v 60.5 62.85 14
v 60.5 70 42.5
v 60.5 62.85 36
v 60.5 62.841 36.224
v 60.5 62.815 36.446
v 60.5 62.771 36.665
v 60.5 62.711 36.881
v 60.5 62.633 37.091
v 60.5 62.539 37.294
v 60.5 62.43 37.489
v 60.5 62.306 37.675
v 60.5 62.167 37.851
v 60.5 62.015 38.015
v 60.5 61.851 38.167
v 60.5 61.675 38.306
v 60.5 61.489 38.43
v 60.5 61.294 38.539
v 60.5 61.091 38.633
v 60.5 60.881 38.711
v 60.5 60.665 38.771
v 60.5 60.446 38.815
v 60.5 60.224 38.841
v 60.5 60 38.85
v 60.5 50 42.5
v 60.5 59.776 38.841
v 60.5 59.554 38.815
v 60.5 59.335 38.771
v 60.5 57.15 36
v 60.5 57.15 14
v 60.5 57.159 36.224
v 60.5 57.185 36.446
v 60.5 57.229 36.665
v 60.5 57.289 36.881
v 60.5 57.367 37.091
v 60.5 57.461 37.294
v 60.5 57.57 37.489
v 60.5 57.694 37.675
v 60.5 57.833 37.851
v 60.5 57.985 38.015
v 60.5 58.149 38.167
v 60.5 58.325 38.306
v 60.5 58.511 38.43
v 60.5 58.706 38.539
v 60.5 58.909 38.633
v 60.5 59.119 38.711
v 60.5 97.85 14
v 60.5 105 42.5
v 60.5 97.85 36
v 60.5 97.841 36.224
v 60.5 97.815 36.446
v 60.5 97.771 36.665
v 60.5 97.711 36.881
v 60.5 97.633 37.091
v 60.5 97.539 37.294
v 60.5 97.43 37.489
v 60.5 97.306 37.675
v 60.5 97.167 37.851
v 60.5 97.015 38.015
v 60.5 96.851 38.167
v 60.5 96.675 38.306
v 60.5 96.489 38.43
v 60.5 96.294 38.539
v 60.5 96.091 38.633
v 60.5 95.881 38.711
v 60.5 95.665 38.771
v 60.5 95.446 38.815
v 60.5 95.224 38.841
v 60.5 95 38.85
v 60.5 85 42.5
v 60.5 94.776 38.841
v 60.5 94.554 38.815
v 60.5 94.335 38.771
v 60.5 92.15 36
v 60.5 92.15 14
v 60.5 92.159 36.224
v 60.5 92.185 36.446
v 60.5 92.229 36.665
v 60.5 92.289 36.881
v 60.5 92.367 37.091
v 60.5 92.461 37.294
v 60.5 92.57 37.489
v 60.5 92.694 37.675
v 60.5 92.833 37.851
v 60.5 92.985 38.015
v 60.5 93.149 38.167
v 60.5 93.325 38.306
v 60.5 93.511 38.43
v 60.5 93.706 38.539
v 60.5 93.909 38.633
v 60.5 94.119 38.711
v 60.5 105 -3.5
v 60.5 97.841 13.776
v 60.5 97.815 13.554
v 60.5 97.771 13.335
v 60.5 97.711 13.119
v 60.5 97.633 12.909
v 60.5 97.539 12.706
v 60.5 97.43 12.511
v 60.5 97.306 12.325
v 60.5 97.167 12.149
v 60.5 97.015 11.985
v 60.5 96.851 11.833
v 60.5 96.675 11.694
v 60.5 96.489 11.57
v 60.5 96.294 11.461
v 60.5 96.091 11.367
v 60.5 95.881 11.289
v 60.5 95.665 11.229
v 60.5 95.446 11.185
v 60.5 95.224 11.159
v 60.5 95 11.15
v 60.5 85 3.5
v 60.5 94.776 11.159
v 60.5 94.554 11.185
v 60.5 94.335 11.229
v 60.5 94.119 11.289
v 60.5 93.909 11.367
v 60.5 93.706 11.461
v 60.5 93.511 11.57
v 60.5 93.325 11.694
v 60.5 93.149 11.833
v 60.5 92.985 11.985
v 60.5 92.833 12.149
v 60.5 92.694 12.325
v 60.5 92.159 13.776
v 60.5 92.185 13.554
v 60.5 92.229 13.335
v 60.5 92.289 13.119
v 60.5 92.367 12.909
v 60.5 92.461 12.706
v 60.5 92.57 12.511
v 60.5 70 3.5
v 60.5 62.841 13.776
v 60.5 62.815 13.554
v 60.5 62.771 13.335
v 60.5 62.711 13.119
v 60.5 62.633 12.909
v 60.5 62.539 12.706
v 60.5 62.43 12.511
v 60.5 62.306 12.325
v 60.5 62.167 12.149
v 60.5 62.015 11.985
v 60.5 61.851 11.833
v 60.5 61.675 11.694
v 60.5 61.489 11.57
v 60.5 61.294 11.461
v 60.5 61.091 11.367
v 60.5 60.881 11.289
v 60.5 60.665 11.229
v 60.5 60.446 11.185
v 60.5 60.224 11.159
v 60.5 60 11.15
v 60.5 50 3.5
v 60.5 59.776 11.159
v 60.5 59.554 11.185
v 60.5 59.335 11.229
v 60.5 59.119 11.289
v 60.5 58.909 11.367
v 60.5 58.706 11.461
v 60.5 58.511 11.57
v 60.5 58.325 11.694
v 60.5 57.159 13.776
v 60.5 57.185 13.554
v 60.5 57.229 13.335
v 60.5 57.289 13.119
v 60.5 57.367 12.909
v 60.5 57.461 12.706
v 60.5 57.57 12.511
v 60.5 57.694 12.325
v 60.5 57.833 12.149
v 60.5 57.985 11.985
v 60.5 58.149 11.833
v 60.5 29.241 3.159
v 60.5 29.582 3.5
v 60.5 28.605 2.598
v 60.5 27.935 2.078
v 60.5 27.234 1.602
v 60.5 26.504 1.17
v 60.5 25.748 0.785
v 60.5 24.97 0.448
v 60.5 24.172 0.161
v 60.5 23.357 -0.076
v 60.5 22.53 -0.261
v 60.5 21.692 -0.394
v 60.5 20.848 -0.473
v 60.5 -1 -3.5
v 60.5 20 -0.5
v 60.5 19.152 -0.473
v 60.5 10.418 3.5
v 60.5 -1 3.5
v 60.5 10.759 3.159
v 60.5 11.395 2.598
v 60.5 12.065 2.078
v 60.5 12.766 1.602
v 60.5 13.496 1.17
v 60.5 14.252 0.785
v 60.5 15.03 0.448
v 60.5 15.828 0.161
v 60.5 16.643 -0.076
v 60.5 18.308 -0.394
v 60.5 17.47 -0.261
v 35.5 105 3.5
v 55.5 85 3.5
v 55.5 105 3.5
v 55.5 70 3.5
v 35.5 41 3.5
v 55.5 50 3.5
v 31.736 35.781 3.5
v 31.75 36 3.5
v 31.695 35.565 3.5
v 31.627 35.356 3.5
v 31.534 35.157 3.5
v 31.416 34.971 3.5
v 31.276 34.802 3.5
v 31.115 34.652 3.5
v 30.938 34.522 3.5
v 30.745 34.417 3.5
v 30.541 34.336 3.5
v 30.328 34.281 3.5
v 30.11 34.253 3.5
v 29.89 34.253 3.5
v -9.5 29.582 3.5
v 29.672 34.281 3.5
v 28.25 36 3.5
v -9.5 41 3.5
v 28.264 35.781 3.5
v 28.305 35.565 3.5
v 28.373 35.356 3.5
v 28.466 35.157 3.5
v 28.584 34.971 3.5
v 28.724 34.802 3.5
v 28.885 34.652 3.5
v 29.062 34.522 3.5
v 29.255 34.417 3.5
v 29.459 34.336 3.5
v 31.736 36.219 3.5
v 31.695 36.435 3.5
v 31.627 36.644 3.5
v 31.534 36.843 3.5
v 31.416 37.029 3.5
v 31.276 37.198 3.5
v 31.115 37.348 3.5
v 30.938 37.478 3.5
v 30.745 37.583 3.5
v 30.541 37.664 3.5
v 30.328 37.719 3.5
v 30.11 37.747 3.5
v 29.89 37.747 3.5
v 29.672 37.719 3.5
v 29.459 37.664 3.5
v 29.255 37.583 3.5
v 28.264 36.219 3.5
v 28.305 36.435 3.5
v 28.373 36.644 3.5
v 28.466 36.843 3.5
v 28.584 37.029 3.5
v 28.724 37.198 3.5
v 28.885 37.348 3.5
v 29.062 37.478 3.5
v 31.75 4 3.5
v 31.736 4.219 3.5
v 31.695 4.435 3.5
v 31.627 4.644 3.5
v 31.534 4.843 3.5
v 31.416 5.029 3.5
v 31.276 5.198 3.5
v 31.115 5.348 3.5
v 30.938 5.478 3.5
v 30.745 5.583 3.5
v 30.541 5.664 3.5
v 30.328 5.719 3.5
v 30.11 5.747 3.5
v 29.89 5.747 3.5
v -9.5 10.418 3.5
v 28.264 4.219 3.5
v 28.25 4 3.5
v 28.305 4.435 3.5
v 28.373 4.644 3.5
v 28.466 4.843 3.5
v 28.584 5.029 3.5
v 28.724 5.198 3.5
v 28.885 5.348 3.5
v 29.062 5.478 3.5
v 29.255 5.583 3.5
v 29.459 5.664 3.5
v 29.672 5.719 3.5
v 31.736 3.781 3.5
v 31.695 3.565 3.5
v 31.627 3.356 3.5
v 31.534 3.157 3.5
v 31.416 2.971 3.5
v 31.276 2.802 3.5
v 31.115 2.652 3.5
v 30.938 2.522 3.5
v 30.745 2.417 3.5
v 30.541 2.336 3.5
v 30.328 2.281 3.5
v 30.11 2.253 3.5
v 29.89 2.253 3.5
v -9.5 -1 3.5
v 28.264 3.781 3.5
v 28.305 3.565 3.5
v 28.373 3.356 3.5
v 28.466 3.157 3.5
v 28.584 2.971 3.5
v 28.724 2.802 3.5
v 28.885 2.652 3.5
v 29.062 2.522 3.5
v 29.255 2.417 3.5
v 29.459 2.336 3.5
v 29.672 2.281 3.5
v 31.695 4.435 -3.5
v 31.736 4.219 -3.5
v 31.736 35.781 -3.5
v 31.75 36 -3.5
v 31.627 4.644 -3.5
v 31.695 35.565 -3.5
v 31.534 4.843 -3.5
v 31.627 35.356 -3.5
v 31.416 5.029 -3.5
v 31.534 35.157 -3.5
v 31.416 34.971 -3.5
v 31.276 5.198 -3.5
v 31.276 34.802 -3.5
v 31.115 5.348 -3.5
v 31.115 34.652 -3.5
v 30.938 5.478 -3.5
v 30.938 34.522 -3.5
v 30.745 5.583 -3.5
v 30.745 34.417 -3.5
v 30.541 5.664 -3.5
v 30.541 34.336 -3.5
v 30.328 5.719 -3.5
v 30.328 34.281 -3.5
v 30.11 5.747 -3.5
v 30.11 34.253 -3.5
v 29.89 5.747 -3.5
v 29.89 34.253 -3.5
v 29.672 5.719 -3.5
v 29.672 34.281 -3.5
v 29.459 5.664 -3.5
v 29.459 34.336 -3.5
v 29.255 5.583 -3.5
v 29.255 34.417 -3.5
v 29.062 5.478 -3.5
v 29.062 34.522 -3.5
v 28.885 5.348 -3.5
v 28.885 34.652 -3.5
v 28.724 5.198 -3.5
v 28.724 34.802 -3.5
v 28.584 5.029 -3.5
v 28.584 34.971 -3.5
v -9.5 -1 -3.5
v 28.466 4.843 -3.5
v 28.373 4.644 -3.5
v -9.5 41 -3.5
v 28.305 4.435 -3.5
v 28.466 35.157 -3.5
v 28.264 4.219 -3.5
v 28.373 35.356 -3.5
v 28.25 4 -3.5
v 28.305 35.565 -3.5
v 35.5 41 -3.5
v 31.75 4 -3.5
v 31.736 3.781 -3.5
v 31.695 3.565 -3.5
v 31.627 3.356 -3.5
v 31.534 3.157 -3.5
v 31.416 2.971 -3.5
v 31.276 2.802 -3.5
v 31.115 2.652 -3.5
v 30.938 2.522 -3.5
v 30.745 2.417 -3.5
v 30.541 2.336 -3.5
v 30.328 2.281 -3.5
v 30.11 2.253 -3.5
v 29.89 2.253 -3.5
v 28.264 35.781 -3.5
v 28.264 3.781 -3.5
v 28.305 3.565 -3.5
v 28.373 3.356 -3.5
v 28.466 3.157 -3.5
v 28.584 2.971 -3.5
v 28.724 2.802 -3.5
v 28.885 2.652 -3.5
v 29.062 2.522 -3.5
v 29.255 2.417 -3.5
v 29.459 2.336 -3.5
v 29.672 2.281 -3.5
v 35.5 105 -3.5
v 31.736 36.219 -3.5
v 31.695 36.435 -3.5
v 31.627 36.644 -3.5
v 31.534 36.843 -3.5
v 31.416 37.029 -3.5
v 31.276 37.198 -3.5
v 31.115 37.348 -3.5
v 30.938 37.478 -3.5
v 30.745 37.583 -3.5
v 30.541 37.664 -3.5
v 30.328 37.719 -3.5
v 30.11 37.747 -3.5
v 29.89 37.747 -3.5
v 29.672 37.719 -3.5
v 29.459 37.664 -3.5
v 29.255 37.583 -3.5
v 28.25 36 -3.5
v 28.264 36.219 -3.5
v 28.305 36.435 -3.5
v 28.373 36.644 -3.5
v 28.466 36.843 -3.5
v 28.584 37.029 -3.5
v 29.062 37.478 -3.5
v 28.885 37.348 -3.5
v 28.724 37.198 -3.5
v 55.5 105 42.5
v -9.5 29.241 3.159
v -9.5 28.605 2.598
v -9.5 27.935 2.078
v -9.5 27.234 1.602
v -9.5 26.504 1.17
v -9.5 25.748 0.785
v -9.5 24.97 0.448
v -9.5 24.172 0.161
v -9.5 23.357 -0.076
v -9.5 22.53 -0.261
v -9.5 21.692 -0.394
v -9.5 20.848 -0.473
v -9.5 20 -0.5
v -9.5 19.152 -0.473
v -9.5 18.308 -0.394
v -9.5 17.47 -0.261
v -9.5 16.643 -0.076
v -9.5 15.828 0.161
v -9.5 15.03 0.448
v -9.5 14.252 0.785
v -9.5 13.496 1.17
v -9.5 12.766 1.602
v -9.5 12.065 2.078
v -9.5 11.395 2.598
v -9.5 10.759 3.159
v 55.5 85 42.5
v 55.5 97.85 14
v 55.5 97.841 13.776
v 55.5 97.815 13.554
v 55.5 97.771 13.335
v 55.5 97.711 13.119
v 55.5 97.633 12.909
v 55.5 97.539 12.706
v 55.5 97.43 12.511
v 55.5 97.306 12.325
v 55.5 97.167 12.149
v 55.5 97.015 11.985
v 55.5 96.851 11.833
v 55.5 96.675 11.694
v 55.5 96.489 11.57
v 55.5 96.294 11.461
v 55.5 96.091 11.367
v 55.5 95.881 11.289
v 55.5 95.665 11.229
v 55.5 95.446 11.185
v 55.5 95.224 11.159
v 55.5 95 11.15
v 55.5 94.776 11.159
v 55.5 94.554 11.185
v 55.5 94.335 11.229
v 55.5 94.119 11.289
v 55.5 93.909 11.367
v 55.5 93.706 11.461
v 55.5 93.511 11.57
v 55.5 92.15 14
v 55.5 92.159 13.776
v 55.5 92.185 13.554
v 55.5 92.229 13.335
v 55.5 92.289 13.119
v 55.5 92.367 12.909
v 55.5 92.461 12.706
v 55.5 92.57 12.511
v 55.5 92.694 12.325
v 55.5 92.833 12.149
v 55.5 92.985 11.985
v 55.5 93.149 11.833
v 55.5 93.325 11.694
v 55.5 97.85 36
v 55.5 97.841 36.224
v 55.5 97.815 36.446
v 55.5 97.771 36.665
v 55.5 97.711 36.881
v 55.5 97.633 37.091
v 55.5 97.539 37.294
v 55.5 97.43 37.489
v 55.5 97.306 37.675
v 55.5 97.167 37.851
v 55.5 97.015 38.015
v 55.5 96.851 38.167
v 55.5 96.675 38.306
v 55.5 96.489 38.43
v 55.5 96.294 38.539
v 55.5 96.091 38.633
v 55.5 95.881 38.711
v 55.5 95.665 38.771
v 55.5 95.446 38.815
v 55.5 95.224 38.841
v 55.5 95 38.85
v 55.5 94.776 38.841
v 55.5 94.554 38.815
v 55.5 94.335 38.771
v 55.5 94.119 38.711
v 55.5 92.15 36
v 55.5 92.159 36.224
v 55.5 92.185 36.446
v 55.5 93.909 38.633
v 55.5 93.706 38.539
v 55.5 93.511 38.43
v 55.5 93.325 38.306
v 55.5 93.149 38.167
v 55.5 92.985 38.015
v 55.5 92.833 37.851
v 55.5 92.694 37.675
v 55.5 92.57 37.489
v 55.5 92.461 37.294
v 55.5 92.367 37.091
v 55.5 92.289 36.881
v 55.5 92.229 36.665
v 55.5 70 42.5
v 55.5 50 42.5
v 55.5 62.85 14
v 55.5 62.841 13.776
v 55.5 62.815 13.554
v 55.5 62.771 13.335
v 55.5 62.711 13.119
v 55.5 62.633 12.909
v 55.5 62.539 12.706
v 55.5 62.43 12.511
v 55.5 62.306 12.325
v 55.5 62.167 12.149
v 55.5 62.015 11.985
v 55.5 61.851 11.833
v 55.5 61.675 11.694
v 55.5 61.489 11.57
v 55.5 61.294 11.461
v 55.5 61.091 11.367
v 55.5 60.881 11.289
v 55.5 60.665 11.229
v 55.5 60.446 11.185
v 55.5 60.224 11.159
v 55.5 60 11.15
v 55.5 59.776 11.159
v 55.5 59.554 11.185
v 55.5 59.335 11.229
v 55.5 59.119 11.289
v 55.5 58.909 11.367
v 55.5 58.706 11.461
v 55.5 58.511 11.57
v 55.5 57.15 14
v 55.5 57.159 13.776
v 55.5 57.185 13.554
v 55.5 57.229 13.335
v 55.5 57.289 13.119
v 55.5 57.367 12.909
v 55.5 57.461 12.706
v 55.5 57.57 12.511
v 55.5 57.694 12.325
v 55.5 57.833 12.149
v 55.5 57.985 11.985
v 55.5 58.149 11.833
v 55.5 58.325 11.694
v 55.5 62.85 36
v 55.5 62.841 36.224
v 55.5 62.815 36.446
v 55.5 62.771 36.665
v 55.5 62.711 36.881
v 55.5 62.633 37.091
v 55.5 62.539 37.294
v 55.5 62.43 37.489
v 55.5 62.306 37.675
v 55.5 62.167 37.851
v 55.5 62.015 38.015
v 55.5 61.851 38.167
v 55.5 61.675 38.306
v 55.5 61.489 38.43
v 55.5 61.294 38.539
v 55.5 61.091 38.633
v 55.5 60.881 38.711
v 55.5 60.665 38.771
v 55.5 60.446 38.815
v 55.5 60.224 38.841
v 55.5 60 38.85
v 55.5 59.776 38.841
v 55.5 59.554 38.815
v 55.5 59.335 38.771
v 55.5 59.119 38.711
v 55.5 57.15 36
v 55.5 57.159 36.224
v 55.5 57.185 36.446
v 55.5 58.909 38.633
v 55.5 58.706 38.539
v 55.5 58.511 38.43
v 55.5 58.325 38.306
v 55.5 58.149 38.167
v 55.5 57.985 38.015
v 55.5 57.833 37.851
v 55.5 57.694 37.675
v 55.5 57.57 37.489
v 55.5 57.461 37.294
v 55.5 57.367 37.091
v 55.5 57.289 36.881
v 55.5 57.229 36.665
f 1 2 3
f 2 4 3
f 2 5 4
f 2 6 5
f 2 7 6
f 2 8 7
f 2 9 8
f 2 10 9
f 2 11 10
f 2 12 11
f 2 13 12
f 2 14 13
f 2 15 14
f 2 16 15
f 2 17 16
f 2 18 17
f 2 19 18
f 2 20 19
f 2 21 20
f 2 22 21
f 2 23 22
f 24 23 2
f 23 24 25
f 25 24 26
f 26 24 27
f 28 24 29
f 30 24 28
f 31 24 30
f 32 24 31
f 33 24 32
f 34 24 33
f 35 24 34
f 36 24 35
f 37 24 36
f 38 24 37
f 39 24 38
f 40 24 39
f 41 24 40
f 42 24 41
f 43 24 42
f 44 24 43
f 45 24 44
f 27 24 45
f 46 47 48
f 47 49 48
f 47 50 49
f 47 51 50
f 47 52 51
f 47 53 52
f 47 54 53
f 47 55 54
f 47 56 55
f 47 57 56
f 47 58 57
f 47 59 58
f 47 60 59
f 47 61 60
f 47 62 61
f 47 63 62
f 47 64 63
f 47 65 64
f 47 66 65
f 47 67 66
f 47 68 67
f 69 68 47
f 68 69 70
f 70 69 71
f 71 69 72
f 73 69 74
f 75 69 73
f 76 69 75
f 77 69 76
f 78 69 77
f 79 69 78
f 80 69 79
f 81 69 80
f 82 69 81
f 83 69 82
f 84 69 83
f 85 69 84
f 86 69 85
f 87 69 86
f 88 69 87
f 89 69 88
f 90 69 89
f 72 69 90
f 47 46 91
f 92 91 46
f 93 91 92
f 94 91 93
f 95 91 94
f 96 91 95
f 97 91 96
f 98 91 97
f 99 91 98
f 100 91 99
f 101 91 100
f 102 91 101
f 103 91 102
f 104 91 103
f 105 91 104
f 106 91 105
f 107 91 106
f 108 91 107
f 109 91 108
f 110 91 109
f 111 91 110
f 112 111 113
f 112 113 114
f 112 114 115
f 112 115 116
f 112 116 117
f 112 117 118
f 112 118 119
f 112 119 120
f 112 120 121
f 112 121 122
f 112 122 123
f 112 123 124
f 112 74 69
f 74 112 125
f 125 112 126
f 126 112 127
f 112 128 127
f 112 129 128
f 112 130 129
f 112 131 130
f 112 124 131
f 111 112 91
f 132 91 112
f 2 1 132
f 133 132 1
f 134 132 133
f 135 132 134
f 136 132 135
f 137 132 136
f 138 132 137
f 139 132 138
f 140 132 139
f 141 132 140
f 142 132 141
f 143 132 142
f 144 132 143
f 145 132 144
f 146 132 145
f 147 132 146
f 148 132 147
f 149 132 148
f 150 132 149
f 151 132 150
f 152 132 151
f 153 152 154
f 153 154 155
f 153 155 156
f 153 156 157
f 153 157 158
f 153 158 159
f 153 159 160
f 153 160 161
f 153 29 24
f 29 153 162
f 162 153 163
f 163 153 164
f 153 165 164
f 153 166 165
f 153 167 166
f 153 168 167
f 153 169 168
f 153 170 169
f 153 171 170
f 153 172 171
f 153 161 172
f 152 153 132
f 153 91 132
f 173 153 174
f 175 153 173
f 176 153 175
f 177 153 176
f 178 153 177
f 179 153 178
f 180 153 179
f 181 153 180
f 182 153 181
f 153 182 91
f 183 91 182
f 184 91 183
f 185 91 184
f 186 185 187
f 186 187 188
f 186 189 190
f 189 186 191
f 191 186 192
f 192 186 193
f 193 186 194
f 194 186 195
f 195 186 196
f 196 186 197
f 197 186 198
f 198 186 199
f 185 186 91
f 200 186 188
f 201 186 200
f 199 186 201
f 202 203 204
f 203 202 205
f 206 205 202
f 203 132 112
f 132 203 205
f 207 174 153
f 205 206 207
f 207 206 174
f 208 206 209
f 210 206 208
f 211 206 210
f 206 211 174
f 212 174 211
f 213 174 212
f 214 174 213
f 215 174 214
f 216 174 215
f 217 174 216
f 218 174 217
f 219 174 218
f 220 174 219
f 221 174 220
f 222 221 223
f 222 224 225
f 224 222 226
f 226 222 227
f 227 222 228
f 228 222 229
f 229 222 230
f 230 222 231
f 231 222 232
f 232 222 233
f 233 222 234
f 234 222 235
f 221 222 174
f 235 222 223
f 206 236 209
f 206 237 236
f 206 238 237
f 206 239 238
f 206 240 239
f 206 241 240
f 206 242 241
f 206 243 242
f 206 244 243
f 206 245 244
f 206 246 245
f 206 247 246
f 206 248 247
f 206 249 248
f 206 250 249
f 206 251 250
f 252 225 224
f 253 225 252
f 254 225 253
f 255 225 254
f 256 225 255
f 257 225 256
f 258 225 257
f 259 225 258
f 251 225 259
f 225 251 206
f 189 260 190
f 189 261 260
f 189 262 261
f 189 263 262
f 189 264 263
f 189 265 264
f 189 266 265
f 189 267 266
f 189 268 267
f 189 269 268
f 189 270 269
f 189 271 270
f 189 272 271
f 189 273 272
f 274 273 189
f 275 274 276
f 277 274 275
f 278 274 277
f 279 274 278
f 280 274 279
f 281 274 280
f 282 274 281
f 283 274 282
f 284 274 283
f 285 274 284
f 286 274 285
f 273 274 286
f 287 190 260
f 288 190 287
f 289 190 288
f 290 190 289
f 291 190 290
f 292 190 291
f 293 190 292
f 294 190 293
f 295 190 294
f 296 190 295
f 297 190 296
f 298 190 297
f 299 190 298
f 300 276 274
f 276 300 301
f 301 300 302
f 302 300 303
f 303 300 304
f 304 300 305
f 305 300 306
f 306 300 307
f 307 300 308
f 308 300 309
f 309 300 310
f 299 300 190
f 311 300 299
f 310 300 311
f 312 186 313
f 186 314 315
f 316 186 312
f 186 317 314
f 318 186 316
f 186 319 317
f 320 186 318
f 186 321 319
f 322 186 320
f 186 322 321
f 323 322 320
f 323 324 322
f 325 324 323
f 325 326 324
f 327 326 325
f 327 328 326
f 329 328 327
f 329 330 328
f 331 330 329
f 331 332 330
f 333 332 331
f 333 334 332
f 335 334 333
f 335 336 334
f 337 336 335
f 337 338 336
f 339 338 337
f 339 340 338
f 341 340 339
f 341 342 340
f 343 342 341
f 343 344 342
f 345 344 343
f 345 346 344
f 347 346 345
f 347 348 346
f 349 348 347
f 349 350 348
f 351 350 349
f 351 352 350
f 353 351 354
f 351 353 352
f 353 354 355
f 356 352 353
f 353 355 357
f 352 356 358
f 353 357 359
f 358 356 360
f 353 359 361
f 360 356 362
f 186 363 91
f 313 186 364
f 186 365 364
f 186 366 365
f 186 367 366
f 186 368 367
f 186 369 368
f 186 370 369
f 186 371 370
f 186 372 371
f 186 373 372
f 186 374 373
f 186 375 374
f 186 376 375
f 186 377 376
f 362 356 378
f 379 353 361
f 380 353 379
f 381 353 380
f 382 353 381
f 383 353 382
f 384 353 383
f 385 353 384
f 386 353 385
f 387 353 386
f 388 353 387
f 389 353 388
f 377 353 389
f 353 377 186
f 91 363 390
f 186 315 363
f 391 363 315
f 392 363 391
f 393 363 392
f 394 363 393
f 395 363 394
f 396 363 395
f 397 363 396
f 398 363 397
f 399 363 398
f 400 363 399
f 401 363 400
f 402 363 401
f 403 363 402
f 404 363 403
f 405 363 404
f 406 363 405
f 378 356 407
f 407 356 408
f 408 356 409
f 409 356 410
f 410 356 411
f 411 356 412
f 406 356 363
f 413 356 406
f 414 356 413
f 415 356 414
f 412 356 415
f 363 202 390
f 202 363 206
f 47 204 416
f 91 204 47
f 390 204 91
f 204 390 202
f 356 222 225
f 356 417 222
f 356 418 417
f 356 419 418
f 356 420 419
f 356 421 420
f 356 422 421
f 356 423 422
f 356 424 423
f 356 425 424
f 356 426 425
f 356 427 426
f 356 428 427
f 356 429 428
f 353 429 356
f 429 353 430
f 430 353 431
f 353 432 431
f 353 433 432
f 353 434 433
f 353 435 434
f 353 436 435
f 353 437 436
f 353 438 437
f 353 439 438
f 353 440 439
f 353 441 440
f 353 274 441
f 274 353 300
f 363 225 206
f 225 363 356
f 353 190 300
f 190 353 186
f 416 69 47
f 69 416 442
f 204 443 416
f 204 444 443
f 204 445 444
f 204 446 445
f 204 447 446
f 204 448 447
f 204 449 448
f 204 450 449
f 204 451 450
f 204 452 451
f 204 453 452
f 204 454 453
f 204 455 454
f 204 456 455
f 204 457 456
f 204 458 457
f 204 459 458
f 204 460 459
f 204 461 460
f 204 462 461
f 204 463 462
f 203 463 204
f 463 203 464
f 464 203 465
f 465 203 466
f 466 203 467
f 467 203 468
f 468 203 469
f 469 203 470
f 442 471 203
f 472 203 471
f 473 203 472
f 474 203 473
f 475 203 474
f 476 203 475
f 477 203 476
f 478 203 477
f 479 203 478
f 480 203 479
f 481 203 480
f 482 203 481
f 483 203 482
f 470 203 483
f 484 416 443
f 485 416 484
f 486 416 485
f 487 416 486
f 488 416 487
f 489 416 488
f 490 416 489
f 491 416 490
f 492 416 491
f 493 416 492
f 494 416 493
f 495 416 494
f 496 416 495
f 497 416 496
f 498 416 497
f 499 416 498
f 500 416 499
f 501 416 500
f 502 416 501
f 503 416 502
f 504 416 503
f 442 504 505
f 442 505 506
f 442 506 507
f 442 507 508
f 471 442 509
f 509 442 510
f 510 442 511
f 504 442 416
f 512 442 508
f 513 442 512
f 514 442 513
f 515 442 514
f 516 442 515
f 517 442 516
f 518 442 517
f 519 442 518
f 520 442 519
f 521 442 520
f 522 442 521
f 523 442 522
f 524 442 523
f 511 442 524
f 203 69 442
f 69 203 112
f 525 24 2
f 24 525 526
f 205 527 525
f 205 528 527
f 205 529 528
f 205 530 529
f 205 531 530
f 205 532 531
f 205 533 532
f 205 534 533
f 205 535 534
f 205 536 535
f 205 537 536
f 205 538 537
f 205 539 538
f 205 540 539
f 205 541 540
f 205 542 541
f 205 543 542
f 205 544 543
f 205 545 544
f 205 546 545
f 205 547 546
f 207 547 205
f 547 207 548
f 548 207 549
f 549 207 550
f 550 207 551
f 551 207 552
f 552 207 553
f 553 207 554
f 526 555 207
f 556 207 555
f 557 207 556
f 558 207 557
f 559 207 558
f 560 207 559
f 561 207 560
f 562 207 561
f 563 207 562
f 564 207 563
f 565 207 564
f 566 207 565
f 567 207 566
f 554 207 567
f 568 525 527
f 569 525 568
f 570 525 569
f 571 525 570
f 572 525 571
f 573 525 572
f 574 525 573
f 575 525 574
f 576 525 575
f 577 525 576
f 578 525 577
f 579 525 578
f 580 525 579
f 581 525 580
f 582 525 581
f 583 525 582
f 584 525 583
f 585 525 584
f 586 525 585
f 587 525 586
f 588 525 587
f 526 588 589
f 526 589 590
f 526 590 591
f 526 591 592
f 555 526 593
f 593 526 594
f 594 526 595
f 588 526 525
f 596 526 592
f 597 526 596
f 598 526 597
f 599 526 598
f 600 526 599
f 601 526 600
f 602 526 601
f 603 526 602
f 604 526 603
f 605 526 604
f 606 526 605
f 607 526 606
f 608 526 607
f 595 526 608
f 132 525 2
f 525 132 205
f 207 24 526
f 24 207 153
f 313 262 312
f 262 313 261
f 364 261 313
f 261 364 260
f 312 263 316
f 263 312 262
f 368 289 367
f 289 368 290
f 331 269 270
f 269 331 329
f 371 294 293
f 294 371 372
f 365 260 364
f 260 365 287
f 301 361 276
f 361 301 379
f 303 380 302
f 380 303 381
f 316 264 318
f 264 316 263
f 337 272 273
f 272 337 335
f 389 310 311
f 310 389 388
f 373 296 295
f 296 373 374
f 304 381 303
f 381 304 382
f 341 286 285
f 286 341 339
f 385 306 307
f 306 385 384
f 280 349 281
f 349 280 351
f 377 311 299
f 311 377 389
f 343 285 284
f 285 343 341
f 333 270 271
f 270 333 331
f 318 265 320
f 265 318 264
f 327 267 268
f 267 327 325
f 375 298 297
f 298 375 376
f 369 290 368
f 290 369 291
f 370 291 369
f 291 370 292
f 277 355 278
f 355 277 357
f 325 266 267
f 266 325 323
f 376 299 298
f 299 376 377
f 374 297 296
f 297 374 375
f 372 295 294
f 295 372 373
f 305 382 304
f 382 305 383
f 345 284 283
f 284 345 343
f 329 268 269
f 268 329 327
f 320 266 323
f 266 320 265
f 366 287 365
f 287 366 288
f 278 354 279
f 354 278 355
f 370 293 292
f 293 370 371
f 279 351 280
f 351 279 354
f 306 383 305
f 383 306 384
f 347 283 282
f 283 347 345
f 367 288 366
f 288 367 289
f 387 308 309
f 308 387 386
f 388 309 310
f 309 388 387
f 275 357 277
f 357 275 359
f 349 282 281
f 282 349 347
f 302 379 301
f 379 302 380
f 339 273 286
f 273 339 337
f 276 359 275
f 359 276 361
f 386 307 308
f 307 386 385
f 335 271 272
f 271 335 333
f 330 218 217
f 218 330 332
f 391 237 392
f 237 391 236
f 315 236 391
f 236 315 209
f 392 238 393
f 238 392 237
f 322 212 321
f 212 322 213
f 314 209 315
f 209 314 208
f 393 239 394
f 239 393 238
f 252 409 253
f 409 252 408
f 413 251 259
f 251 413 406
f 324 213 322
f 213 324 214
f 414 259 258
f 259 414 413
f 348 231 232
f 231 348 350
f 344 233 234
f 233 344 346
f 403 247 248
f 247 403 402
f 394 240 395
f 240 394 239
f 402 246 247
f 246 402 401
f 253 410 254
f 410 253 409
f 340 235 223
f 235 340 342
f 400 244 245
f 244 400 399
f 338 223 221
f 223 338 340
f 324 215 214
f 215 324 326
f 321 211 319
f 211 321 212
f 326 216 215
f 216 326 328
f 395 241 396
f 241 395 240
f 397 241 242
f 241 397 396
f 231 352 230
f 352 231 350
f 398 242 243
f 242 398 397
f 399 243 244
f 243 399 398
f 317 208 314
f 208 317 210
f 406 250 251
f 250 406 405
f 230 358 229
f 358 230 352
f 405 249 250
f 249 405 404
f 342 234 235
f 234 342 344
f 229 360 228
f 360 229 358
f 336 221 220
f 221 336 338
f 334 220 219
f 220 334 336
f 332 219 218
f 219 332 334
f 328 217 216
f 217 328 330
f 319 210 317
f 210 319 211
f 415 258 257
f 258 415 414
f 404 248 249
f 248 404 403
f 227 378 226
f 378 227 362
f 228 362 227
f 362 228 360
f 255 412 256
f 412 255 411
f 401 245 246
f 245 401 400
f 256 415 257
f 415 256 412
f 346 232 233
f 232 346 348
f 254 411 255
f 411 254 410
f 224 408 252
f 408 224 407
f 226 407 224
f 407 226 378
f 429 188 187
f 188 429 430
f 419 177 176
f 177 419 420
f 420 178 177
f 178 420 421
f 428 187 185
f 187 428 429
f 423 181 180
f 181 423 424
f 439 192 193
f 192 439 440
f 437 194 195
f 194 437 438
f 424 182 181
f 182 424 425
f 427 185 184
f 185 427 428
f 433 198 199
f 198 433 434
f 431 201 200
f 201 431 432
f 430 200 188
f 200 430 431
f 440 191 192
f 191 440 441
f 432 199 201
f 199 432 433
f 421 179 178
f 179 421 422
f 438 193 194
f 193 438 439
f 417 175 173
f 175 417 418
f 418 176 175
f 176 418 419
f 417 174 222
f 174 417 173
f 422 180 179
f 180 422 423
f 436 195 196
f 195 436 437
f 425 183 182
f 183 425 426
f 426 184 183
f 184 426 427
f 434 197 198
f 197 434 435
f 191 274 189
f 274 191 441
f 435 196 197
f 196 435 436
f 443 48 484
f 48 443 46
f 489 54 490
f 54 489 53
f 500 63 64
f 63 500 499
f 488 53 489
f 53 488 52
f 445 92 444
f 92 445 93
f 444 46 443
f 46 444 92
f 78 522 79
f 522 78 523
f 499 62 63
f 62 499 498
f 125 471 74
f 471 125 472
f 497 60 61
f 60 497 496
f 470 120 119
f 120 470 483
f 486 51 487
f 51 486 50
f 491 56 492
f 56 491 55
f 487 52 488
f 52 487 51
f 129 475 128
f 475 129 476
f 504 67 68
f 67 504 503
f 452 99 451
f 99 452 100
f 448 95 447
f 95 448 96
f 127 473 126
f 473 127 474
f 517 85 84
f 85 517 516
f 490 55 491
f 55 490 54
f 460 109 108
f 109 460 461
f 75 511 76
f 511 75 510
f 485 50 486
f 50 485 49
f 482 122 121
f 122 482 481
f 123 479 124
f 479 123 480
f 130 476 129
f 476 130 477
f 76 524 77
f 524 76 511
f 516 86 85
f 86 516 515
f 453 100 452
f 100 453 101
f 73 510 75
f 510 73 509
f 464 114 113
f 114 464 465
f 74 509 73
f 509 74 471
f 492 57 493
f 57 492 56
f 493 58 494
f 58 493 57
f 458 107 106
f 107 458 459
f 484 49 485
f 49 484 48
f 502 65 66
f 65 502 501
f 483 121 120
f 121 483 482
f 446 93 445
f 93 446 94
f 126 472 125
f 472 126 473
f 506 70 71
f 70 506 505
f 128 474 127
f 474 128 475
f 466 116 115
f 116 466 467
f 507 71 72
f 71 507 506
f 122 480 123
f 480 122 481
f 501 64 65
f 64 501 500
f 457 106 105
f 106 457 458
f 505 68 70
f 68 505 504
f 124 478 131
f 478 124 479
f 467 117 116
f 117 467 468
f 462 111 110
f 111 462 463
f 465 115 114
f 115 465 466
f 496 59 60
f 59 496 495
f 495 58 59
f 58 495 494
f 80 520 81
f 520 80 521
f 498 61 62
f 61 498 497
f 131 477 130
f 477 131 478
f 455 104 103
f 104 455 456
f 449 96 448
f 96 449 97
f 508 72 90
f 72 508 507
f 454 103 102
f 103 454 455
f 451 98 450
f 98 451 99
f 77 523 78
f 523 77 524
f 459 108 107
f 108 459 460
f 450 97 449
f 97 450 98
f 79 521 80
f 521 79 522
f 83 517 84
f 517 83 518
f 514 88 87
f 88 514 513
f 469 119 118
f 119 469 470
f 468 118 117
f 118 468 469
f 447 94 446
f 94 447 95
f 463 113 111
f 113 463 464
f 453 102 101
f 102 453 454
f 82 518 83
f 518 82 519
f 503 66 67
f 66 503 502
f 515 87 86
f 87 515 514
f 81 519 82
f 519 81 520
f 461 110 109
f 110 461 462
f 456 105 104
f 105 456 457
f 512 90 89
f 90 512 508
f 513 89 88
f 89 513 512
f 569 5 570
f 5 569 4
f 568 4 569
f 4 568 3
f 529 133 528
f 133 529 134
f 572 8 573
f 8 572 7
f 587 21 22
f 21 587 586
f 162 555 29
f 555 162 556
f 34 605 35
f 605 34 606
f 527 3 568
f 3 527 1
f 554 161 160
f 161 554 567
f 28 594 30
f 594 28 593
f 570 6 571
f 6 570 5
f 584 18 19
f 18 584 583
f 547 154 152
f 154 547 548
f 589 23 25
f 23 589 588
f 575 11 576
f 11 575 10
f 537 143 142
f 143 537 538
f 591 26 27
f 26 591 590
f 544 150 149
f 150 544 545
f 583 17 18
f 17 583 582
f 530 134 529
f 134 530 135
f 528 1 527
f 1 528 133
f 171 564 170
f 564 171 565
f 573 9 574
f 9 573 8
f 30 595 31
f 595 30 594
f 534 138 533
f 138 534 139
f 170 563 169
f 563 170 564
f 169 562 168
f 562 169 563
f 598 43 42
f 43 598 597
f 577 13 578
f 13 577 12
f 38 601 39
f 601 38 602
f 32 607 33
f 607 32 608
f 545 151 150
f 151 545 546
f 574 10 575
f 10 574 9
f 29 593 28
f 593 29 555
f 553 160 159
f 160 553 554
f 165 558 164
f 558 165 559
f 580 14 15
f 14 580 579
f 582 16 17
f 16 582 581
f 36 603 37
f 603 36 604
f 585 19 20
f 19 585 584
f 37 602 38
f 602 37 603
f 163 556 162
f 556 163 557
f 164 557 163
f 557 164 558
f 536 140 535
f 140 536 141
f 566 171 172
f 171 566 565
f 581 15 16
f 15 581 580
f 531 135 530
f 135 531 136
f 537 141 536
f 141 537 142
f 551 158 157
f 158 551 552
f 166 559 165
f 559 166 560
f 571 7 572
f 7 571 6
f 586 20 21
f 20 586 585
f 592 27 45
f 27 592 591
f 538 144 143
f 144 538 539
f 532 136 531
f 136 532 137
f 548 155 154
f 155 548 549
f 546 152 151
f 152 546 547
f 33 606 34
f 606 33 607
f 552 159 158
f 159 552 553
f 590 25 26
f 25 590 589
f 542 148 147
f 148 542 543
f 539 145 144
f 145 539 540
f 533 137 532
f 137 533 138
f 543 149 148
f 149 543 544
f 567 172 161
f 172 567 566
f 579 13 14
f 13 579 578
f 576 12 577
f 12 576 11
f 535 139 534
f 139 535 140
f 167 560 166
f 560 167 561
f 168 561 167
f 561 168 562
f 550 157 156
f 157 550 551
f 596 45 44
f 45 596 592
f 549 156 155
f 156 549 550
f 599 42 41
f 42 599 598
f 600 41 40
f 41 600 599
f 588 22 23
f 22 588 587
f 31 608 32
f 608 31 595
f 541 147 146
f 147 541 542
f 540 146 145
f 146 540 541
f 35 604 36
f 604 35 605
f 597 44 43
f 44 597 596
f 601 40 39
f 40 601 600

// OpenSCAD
difference(){
union(){
translate([48,55,0])cube([25,100,7],center=true);
translate([25.5,20,0])cube([70,42,7],center=true);
translate([58,95,20])cube([5,20,45],center=true);
translate([58,60,20])cube([5,20,45],center=true);
}
translate([-15,20,13])rotate([0,90,0])cylinder(d=27,h=100,$fn=100);
translate([53,95,14])
hull(){
    rotate([0,90,0])cylinder(d=5.7,h=10,$fn=80);
translate([0,0,22])rotate([0,90,0])cylinder(d=5.7,h=10,$fn=80);    
}
translate([53,60,14])
hull(){
    rotate([0,90,0])cylinder(d=5.7,h=10,$fn=80);
translate([0,0,22])rotate([0,90,0])cylinder(d=5.7,h=10,$fn=80);    
}
translate([30,4,-10]){
cylinder(d=3.5,h=20,$fn=50);
translate([0,32,0])cylinder(d=3.5,h=20,$fn=50);
}
}
